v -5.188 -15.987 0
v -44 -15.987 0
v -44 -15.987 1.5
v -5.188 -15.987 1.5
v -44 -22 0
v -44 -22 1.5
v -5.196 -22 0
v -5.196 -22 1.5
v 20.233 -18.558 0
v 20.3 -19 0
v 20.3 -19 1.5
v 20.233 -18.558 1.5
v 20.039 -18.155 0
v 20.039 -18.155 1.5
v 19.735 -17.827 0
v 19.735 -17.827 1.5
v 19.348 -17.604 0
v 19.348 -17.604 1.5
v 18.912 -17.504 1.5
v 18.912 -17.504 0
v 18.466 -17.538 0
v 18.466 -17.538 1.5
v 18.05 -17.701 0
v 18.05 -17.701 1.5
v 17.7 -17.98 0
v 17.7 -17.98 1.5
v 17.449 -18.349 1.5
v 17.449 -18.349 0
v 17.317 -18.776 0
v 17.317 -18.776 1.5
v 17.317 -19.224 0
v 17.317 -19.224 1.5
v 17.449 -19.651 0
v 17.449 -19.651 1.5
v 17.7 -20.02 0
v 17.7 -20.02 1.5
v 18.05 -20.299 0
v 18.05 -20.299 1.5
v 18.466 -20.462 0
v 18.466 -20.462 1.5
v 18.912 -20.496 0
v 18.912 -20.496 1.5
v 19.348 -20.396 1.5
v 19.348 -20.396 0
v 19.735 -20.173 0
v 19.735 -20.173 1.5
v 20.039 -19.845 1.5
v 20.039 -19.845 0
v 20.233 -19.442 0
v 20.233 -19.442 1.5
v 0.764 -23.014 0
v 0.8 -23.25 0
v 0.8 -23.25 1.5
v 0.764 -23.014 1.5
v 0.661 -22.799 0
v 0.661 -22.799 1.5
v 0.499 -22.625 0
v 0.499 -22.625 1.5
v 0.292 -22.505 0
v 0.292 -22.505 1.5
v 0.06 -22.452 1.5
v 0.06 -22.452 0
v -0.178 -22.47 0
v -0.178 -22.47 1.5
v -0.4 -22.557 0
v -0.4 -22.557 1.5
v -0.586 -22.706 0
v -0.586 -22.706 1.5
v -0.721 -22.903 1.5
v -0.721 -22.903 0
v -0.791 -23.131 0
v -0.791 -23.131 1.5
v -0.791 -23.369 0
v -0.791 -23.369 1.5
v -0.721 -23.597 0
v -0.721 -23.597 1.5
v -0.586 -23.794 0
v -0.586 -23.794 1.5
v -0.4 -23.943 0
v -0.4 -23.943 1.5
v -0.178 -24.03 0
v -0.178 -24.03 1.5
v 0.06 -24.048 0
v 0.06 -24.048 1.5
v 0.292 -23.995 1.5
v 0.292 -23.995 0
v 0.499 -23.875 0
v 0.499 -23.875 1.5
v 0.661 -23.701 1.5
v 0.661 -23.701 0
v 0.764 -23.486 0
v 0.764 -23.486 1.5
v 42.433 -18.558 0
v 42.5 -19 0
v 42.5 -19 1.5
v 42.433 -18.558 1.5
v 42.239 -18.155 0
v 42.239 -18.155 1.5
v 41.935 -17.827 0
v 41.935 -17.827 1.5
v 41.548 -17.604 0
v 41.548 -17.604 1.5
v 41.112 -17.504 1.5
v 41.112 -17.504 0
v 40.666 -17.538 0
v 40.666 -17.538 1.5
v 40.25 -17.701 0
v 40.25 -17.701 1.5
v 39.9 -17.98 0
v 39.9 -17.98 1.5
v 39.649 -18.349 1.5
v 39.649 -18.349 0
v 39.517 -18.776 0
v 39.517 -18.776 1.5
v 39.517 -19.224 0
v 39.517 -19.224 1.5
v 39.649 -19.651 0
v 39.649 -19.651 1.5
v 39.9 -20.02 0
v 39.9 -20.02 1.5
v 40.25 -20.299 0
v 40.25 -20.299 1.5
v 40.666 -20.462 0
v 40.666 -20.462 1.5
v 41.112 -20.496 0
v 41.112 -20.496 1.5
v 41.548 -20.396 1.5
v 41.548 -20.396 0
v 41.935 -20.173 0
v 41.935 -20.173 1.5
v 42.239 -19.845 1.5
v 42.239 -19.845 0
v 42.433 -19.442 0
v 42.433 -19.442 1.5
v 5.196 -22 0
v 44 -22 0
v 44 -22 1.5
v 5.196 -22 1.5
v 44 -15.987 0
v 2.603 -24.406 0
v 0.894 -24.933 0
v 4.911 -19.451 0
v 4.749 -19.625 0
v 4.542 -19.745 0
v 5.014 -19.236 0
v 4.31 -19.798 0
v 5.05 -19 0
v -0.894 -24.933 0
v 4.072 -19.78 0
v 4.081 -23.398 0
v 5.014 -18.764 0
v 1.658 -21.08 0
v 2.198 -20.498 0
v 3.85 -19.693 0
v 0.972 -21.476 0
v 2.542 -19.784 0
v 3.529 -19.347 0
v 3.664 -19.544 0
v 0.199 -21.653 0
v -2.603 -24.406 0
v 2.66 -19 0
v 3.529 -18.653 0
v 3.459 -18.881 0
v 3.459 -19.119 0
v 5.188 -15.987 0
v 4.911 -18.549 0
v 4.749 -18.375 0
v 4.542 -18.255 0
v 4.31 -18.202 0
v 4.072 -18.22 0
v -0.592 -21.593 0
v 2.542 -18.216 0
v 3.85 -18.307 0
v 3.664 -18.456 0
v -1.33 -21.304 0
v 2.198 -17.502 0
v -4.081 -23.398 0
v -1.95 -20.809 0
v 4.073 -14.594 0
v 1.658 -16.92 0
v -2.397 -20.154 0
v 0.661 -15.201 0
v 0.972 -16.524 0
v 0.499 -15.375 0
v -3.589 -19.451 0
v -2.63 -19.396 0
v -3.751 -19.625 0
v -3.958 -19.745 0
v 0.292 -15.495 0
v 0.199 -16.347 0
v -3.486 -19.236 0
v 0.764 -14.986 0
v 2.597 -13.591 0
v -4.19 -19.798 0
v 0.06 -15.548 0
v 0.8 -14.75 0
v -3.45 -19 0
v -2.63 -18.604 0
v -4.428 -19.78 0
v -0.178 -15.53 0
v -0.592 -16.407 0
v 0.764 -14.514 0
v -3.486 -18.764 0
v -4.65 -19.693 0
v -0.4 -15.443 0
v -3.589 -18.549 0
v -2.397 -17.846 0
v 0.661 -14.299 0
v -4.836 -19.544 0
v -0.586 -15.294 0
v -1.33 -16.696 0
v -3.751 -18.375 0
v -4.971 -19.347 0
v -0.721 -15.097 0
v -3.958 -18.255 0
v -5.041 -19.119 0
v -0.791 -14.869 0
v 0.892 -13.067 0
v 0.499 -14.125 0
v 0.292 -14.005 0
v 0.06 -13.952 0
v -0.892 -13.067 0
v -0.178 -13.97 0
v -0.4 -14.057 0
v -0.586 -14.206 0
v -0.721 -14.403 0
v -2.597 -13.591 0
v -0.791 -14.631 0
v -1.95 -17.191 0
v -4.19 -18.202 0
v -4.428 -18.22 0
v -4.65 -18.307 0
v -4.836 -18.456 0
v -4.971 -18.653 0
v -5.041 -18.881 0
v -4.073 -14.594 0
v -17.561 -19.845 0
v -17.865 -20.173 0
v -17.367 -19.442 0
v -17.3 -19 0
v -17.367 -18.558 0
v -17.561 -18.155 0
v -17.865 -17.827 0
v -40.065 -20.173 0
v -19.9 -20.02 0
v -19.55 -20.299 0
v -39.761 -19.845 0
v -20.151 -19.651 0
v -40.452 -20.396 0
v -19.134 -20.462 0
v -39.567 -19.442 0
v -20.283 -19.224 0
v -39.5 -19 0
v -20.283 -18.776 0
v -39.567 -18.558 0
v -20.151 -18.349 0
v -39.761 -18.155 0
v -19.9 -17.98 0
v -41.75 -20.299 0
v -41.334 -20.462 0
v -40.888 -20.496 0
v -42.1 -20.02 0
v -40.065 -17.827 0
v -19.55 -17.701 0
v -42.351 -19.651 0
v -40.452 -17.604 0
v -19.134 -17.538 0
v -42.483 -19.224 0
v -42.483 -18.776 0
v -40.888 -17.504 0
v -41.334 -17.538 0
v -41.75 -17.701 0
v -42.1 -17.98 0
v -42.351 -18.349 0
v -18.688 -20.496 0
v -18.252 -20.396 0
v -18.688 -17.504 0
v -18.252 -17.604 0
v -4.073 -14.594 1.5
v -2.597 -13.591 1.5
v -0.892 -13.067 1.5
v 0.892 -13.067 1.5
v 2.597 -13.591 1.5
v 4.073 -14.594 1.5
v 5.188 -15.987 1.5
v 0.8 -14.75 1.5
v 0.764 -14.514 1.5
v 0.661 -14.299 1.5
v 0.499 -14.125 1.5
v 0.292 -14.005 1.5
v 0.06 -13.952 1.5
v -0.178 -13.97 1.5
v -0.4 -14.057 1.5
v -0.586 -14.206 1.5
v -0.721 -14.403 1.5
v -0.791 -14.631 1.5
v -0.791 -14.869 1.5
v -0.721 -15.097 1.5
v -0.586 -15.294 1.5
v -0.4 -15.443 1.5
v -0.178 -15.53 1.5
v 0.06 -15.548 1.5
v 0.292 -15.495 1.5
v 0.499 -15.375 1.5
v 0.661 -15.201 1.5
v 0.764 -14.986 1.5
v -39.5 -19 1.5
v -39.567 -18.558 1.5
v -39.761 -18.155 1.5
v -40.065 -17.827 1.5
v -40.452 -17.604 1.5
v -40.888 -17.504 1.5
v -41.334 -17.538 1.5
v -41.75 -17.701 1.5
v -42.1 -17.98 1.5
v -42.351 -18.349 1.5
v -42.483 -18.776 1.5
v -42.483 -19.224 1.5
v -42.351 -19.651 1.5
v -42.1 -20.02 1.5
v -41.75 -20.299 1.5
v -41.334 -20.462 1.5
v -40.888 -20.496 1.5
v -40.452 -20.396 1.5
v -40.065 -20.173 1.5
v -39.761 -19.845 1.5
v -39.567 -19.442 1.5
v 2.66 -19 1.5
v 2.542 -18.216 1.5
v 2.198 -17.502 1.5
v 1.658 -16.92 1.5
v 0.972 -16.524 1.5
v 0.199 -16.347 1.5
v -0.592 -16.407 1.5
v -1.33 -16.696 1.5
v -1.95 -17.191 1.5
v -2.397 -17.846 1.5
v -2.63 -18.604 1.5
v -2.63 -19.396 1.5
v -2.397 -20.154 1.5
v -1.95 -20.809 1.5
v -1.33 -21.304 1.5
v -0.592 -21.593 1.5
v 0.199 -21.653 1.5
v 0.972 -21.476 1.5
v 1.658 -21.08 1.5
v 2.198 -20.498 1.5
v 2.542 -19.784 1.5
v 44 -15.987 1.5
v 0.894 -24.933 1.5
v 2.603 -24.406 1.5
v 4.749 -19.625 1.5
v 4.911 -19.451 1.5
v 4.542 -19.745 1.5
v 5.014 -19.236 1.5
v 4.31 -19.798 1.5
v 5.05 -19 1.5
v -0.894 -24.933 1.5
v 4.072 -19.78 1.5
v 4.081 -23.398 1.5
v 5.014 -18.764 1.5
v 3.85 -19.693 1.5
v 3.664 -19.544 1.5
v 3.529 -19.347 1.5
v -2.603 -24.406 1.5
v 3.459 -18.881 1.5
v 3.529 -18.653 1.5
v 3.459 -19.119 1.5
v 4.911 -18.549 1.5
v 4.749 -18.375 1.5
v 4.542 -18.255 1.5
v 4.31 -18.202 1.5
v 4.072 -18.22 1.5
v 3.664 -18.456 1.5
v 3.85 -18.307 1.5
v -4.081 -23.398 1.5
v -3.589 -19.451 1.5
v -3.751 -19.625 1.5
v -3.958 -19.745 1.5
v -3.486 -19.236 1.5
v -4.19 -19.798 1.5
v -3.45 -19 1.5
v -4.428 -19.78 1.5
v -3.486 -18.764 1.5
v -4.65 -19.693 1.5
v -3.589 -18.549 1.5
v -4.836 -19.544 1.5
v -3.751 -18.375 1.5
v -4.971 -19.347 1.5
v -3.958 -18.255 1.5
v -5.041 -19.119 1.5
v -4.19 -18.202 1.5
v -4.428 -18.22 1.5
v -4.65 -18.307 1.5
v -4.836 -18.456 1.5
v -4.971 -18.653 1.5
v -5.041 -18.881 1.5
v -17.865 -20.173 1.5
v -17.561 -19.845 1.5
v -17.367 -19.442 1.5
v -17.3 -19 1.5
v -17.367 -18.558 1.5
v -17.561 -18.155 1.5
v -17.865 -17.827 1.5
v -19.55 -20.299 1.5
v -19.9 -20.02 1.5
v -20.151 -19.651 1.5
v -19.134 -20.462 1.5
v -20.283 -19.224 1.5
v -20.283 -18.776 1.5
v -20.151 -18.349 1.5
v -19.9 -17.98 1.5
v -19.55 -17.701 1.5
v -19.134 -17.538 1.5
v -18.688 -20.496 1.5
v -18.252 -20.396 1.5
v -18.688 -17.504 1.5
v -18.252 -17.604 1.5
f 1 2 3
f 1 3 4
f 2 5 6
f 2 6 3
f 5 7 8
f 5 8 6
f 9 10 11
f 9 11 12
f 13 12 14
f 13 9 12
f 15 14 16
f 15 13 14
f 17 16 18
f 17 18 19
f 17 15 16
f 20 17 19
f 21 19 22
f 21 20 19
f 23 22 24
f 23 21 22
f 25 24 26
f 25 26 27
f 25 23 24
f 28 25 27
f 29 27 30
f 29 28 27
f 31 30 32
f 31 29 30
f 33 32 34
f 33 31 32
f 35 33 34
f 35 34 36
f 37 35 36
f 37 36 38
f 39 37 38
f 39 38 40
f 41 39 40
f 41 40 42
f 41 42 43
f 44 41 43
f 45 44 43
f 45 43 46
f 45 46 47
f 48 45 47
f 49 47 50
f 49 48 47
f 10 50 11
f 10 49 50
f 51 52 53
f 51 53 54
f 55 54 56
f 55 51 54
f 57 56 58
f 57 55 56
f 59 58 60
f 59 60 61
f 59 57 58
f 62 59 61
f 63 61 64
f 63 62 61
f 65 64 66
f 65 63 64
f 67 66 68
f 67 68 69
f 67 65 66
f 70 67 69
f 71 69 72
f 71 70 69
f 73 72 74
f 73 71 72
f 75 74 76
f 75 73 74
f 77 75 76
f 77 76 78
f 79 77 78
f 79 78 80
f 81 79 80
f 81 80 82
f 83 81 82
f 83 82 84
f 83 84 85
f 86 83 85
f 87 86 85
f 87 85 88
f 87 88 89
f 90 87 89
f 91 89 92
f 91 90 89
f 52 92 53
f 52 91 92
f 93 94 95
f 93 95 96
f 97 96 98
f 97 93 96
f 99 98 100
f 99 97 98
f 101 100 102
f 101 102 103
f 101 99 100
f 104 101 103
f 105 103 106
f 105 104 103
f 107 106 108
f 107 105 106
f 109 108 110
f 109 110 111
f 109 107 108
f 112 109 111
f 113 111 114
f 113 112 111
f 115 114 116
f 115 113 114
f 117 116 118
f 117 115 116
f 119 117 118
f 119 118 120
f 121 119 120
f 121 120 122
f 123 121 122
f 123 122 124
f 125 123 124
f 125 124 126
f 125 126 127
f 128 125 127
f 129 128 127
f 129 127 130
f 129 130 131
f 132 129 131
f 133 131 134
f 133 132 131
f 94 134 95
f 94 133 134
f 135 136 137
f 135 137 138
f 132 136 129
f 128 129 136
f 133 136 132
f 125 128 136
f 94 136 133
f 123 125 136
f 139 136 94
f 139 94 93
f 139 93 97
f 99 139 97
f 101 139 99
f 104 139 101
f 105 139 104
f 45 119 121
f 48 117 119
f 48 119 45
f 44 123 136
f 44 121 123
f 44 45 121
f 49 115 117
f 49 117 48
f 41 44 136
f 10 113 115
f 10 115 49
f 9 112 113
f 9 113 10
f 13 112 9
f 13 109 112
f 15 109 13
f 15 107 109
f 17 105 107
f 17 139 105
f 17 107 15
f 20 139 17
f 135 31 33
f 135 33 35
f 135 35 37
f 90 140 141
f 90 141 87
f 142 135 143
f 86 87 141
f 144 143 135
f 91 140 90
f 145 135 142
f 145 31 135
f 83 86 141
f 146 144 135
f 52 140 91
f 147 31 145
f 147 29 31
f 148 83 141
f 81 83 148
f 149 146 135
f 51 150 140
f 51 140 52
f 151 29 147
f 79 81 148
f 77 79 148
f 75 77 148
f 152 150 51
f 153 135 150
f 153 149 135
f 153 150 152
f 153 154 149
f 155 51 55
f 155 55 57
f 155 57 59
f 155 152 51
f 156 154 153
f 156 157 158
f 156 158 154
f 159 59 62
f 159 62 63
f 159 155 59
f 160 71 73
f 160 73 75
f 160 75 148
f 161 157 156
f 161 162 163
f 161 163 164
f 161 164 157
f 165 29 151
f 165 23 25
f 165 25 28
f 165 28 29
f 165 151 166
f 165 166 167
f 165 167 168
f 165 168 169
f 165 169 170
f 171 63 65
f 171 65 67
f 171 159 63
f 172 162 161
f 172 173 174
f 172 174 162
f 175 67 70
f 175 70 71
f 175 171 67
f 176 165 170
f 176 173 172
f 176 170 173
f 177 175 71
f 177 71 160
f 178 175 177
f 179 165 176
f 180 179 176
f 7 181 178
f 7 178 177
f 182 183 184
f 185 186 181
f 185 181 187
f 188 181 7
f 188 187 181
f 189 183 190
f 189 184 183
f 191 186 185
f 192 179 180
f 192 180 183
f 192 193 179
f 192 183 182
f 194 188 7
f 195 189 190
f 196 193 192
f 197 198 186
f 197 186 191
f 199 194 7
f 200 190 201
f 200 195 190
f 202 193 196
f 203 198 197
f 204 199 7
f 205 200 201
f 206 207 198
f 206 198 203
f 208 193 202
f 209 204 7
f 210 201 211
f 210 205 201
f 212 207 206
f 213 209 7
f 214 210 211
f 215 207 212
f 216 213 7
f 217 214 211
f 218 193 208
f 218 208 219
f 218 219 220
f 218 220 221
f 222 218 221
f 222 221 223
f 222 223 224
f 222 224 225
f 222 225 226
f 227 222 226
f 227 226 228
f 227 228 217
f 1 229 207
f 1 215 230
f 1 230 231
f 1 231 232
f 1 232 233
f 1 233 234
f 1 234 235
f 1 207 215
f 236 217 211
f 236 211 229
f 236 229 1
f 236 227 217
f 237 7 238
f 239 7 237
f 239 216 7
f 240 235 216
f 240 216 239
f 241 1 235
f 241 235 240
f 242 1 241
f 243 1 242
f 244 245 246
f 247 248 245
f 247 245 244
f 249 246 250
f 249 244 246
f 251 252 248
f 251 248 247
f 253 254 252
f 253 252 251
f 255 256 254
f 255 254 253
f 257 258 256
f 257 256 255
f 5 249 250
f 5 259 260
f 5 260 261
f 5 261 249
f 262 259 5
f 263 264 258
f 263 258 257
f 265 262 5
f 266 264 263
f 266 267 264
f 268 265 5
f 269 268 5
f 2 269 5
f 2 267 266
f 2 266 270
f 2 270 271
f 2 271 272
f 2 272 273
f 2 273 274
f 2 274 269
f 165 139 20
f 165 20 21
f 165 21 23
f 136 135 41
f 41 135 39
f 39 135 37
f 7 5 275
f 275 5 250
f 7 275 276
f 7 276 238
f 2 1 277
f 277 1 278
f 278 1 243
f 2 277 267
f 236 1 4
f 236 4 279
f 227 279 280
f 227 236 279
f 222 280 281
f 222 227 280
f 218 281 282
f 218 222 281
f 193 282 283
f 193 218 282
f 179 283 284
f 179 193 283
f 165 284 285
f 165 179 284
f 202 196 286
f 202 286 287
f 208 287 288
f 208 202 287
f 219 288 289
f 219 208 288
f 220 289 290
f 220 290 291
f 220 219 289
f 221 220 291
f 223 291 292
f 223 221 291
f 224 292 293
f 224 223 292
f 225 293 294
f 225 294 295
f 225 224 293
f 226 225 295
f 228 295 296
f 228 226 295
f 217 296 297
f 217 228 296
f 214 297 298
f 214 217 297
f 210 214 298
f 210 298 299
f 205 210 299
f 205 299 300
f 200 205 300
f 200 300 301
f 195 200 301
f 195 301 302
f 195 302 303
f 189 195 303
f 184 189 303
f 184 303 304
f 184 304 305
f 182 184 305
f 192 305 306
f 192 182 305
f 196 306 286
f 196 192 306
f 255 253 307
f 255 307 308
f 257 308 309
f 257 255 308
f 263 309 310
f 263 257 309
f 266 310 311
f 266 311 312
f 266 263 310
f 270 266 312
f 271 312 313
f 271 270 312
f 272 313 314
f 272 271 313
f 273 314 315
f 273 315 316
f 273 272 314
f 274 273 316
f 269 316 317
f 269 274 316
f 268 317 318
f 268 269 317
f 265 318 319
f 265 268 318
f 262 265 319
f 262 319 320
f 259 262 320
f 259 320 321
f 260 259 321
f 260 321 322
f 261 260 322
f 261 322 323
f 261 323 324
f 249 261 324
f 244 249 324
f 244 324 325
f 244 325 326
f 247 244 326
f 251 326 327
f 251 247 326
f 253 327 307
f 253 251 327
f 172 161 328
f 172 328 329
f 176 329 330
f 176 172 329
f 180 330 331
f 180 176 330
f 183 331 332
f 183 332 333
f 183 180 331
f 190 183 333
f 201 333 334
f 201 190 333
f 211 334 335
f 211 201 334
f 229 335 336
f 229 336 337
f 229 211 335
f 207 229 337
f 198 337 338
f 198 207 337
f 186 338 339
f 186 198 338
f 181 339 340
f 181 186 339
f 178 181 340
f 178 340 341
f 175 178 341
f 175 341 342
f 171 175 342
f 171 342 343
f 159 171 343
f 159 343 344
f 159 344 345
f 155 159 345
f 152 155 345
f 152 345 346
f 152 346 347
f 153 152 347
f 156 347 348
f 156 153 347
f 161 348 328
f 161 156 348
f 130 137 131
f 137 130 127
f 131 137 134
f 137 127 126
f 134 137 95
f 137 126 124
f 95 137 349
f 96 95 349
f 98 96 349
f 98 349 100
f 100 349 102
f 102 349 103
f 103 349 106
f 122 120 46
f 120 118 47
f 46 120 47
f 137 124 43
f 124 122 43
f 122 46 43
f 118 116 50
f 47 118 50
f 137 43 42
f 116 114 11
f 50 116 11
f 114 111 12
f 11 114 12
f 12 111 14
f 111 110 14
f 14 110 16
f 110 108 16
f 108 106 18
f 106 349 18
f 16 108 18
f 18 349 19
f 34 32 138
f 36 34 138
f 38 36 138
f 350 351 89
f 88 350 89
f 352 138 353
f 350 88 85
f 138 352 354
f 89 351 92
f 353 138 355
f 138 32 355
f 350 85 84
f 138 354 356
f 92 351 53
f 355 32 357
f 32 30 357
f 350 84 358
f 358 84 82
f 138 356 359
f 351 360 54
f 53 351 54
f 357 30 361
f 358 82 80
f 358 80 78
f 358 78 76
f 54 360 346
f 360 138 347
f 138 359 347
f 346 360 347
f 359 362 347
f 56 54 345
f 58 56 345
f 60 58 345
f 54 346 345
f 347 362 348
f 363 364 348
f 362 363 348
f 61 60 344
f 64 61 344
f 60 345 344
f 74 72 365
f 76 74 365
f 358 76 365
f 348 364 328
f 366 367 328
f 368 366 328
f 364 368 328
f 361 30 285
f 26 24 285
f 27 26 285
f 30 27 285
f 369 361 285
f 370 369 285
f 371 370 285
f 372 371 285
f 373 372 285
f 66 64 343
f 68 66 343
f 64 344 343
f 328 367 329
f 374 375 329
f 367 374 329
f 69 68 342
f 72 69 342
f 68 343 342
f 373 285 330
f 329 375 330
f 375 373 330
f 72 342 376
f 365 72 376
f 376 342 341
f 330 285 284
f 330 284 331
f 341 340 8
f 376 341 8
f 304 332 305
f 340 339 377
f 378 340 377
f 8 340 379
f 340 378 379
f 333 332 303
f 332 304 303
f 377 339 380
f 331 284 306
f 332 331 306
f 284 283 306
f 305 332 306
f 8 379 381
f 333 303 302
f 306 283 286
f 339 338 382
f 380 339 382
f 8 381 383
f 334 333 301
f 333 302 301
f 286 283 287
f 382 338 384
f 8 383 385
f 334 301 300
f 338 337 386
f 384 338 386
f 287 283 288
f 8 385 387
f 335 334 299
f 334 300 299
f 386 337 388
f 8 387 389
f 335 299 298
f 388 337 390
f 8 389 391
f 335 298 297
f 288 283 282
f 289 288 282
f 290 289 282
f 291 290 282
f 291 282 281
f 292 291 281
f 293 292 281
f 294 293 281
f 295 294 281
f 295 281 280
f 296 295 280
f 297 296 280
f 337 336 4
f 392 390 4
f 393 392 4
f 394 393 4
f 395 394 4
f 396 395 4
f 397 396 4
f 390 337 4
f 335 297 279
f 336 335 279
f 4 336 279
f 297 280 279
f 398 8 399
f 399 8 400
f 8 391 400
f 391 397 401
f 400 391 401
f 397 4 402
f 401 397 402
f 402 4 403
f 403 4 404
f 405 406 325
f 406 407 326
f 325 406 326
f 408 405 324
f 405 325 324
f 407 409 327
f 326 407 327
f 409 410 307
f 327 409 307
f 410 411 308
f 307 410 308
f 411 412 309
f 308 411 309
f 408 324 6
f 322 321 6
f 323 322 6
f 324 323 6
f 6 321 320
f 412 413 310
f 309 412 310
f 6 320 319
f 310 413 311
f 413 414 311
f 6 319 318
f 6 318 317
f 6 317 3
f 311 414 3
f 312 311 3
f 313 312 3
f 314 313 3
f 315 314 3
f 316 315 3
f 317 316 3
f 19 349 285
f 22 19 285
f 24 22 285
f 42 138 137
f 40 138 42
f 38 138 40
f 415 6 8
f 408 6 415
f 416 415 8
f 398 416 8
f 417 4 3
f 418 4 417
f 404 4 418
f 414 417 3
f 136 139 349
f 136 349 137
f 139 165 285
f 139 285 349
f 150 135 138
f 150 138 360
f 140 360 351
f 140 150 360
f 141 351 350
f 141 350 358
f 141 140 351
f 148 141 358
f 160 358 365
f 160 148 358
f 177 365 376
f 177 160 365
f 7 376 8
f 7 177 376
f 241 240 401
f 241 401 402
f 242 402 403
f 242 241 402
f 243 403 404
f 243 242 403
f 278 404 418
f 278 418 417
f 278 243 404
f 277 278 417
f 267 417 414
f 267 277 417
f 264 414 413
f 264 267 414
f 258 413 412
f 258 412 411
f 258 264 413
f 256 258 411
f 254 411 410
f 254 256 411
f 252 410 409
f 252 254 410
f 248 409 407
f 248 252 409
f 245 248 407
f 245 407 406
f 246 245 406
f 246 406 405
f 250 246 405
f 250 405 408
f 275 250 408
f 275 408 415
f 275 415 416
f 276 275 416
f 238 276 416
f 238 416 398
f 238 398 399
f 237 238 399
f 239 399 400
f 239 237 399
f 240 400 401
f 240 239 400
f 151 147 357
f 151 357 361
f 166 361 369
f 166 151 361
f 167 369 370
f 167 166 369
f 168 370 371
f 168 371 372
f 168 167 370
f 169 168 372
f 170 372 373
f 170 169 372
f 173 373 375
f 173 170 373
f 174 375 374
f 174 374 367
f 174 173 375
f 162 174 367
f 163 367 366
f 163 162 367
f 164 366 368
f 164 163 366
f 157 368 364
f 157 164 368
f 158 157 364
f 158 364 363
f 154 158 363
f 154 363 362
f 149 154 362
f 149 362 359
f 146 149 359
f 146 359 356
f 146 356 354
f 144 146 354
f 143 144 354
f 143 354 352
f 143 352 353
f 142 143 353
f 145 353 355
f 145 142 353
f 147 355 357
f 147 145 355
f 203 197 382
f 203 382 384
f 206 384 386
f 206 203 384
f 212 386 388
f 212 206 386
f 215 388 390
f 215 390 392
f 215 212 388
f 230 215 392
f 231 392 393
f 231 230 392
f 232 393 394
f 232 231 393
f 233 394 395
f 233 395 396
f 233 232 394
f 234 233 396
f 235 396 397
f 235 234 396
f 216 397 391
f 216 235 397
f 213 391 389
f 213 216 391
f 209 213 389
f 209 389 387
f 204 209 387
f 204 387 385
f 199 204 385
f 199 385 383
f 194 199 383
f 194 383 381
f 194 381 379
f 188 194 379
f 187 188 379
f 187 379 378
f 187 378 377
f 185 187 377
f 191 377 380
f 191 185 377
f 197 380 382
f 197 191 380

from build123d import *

# Parameters (mm, degrees)
SKETCH_2_R      = 1.5
SKETCH_2_R_2    = 0.8
SKETCH_2_R_3    = 2.66
EXTRUDE_1_DEPTH = 1.5


with BuildPart() as part:
    # 草图2 → 凸台-拉伸1 (new body)
    with BuildSketch(Plane.XY):
        with BuildLine():
            Line((5.188427748, -15.986660076), (44, -15.986660076))
            Line((44, -15.986660076), (44, -22))
            Line((44, -22), (5.196152423, -22))
            ThreePointArc((5.196152423, -22), (0, -25), (-5.196152423, -22))
            Line((-5.196152423, -22), (-44, -22))
            Line((-44, -22), (-44, -15.986660076))
            Line((-44, -15.986660076), (-5.188427748, -15.986660076))
            ThreePointArc((-5.188427748, -15.986660076), (0, -13), (5.188427748, -15.986660076))
        make_face()
        with Locations((41, -19)):
            Circle(SKETCH_2_R, mode=Mode.SUBTRACT)
        with Locations((-41, -19)):
            Circle(SKETCH_2_R, mode=Mode.SUBTRACT)
        with Locations((4.25, -19)):
            Circle(SKETCH_2_R_2, mode=Mode.SUBTRACT)
        with Locations((-4.25, -19)):
            Circle(SKETCH_2_R_2, mode=Mode.SUBTRACT)
        with Locations((0, -14.75)):
            Circle(SKETCH_2_R_2, mode=Mode.SUBTRACT)
        with Locations((0, -23.25)):
            Circle(SKETCH_2_R_2, mode=Mode.SUBTRACT)
        with Locations((0, -19)):
            Circle(SKETCH_2_R_3, mode=Mode.SUBTRACT)
        with Locations((-18.8, -19)):
            Circle(SKETCH_2_R, mode=Mode.SUBTRACT)
        with Locations((18.8, -19)):
            Circle(SKETCH_2_R, mode=Mode.SUBTRACT)
    extrude(amount=EXTRUDE_1_DEPTH)


solid = part.part
